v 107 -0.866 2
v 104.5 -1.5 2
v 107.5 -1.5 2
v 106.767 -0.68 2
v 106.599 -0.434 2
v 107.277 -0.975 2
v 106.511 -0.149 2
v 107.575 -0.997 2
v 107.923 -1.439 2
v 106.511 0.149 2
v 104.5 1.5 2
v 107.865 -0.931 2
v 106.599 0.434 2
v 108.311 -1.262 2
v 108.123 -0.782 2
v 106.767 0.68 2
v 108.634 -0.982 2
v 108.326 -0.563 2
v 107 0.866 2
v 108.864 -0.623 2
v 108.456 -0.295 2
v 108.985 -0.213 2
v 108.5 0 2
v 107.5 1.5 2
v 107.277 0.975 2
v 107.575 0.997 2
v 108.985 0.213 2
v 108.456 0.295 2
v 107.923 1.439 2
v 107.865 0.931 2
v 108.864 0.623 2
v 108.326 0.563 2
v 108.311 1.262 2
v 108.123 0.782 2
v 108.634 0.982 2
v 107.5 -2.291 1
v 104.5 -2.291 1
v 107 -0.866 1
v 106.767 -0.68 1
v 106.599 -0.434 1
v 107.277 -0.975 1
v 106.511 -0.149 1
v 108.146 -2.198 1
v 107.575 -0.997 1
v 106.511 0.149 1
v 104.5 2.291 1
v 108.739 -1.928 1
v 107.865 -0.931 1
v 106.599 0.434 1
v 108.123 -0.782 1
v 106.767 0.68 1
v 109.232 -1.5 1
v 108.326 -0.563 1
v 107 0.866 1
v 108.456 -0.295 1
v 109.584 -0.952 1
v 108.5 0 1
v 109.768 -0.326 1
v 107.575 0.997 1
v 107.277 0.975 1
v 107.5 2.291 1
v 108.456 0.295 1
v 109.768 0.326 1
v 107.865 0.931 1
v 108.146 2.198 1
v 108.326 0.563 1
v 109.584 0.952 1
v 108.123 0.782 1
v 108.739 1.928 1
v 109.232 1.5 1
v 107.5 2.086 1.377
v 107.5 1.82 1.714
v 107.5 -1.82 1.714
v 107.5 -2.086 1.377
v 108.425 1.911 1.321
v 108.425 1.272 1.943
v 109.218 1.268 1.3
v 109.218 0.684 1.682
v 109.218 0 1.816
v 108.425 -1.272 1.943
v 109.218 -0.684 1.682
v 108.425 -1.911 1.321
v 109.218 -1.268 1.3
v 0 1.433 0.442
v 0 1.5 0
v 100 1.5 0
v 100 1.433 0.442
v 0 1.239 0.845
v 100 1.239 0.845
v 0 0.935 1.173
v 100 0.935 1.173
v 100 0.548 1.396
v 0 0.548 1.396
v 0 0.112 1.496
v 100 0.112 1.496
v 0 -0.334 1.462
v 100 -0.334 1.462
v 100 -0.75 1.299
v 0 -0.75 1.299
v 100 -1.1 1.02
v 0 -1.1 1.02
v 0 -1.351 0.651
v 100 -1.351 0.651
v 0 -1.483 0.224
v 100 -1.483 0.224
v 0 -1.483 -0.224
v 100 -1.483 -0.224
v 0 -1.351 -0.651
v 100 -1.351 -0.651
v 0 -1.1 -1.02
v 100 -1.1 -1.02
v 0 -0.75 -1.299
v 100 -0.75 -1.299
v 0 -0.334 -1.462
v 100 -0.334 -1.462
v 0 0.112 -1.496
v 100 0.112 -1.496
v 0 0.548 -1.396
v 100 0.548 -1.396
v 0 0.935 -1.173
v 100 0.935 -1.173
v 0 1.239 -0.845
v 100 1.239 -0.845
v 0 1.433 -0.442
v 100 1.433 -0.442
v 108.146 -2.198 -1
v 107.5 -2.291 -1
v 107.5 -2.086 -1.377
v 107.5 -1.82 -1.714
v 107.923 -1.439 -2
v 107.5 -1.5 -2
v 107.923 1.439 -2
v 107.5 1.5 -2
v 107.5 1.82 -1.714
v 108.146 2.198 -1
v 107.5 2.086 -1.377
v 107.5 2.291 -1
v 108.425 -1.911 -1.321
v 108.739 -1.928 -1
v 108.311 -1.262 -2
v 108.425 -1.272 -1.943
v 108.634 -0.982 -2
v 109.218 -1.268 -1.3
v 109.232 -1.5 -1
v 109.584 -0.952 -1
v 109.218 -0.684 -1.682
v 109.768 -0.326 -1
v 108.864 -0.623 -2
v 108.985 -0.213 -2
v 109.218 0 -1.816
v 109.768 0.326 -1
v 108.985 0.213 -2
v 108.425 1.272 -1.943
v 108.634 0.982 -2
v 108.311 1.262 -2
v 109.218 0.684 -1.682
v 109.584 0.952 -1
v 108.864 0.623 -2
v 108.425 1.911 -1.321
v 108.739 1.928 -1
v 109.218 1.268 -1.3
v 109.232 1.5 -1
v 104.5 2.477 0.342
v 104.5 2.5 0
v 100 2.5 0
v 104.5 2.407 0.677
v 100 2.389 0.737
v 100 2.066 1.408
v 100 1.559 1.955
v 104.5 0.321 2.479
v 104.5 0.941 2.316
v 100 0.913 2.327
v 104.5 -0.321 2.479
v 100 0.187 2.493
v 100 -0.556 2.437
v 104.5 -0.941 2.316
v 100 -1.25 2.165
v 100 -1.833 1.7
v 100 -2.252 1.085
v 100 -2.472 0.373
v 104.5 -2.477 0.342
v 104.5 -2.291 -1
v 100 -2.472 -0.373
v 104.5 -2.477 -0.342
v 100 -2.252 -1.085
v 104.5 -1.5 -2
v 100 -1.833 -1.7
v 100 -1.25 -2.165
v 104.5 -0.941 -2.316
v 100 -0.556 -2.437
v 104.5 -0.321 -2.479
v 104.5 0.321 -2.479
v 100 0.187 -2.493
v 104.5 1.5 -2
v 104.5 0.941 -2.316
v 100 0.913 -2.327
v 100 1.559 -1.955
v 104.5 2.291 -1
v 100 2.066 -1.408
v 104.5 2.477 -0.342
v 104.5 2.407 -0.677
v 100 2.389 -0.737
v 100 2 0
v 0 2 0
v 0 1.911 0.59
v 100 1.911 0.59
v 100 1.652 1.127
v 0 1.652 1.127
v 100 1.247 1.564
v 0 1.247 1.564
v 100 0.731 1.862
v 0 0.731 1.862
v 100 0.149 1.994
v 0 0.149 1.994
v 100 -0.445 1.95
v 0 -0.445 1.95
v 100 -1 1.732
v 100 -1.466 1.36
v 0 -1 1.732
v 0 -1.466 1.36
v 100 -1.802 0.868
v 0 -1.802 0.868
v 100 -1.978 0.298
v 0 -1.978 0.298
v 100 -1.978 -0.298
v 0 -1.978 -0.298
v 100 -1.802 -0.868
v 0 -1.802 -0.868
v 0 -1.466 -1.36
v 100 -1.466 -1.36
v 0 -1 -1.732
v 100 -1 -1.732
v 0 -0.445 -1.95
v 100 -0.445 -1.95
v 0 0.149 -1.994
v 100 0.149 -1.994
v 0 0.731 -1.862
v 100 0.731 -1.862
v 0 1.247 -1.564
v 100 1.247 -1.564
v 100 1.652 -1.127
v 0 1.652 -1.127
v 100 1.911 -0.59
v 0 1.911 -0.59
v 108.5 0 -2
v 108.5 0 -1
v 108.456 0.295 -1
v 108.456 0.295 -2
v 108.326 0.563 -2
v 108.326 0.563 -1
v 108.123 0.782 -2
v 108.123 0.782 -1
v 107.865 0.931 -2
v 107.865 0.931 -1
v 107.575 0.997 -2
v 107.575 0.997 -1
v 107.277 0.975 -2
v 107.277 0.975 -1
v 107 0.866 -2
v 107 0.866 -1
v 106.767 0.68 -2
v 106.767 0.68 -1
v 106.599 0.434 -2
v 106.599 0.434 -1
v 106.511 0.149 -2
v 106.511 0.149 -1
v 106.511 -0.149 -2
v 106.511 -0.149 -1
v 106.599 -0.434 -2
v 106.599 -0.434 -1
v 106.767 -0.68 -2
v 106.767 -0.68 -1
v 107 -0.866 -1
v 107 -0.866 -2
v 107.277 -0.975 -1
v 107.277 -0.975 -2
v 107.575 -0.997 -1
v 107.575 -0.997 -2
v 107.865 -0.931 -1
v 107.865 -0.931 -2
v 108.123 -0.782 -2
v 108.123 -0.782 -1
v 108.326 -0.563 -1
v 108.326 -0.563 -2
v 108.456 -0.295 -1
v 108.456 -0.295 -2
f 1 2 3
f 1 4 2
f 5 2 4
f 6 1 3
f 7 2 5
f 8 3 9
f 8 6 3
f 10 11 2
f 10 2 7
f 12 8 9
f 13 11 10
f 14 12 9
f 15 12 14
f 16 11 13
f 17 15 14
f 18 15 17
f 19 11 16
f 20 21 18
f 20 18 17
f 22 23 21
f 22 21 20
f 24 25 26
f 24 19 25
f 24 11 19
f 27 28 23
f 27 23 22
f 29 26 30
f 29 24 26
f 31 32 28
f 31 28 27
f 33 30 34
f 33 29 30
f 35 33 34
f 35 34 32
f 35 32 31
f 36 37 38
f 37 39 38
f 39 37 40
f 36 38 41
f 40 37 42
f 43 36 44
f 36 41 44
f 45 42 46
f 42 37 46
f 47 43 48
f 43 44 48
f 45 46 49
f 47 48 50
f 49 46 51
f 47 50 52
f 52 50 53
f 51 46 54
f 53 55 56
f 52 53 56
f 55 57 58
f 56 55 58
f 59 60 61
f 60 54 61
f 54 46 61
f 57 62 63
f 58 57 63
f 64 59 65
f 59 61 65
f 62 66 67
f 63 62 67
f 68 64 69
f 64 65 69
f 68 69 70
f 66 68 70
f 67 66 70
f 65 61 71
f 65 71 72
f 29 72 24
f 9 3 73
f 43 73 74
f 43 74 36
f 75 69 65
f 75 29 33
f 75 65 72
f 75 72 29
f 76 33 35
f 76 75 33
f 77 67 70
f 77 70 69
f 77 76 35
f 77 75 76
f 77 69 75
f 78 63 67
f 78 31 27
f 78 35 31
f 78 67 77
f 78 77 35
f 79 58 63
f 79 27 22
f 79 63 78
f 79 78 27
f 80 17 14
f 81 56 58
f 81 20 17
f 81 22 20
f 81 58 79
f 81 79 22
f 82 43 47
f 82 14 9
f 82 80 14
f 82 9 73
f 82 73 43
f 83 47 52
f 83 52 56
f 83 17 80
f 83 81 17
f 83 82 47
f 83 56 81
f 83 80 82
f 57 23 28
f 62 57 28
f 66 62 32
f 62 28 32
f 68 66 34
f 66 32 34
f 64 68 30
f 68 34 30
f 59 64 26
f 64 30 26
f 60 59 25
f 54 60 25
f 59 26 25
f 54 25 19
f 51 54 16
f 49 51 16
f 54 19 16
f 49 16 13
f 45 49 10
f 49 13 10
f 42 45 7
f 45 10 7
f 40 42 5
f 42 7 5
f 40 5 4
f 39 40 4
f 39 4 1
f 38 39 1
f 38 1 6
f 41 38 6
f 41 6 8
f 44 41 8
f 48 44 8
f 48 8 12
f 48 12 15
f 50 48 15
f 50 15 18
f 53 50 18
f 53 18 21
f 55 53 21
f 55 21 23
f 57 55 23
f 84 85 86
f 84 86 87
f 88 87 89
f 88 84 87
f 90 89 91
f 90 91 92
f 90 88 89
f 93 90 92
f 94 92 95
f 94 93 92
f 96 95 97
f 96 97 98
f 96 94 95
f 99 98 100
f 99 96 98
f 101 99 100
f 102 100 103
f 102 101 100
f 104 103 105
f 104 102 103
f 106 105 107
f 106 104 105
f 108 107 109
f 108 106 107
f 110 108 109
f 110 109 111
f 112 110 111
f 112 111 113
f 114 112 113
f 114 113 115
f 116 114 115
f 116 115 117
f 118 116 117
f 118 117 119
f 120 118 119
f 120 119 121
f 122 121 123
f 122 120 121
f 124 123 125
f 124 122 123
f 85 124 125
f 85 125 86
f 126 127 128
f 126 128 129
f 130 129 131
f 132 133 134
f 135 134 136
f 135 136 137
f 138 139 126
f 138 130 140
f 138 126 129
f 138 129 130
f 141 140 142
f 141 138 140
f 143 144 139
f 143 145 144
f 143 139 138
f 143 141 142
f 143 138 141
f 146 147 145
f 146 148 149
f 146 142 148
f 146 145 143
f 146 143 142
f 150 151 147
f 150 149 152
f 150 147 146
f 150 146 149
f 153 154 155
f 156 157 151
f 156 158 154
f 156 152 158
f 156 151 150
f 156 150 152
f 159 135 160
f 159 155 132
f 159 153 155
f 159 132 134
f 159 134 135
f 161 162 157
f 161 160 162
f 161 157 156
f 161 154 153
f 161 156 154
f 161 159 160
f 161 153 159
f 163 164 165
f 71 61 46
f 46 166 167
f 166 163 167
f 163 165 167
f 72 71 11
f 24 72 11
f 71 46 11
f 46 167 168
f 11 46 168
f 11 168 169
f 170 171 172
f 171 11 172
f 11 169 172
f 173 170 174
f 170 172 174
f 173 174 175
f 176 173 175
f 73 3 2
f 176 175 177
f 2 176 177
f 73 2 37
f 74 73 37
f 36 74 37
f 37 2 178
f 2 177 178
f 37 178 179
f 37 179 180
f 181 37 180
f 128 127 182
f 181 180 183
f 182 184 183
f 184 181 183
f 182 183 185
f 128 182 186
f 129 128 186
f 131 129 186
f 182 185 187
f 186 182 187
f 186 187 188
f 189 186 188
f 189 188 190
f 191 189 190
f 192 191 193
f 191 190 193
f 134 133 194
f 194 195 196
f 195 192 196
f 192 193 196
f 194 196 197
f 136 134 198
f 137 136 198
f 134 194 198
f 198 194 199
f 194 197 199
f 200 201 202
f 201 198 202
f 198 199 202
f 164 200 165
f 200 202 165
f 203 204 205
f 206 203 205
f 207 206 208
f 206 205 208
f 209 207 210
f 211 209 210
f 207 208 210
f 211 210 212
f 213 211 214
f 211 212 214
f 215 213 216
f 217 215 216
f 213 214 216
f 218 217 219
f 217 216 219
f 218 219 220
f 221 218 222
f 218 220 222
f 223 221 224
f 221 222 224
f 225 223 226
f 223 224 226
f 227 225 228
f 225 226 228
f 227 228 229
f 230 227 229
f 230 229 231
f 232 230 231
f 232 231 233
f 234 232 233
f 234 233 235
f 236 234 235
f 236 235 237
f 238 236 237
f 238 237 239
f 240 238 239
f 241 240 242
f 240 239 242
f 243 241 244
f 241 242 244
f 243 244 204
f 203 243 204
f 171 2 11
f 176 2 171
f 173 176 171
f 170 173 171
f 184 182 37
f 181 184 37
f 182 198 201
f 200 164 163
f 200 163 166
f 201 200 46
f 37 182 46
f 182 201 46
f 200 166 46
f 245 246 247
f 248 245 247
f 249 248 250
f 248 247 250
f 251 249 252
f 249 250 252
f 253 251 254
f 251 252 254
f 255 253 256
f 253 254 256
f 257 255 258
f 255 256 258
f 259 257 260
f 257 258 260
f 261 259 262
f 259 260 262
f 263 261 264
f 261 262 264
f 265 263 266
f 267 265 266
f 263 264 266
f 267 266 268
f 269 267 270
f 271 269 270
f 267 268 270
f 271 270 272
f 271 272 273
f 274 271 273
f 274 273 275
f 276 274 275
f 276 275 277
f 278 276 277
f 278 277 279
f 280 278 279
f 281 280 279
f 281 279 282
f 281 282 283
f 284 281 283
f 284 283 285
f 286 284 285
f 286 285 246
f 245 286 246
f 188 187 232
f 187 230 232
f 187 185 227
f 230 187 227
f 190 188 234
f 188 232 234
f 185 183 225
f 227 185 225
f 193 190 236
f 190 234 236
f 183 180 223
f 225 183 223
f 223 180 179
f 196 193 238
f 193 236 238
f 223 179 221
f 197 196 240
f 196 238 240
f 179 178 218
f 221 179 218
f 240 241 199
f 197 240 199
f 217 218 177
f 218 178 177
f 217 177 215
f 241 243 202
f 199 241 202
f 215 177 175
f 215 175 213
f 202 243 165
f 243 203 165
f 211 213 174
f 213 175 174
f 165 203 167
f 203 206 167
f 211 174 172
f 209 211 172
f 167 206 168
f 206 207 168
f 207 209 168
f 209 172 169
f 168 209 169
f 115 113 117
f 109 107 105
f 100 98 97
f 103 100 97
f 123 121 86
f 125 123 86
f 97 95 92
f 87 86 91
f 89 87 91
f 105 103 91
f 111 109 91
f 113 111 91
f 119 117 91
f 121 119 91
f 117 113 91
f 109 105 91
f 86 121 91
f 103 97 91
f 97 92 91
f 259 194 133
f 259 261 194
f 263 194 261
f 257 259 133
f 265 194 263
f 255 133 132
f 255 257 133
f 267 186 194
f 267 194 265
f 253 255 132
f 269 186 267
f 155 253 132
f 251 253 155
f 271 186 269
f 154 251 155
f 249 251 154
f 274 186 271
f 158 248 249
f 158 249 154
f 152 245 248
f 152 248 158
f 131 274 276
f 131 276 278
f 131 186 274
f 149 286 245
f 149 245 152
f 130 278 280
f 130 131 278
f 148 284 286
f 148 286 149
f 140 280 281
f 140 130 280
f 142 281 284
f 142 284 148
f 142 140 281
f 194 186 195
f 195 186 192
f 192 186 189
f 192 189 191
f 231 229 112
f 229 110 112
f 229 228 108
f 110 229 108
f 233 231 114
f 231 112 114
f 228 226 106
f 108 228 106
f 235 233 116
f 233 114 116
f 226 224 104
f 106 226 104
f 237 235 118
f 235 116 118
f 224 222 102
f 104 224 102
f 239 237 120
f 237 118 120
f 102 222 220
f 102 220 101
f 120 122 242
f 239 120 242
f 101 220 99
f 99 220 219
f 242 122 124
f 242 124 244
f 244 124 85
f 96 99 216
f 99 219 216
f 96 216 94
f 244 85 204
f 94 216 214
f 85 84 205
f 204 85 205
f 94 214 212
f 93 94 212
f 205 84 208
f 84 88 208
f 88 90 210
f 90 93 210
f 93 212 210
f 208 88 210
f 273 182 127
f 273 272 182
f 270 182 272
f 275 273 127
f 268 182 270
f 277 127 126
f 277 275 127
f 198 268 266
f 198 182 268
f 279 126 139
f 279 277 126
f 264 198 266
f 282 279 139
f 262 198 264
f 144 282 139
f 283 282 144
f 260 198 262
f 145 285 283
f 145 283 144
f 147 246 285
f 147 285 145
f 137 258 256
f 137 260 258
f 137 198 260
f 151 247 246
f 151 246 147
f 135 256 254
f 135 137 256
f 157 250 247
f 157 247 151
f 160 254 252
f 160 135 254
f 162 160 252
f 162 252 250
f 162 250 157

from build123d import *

# Parameters (mm, degrees)
F0_R     = 2
F0_R_2   = 1.5
F1_DEPTH = 100
F2_R     = 2.5
F2_R_2   = 2
F2_R_3   = 1.5
F3_DEPTH = 10
F4_R     = 2.5
F5_W     = 10
F5_H     = 2
F6_DEPTH = 5
F7_R     = 1
F8_DEPTH = 4.501


with BuildPart() as f1:
    # F0 (on Right) → F1 (new body)
    with BuildSketch(Plane.YZ):
        Circle(F0_R)
        Circle(F0_R_2, mode=Mode.SUBTRACT)
    extrude(amount=F1_DEPTH)

    # F2 (on face) → F3 (join)
    with BuildSketch(Plane.YZ.offset(100)):
        Circle(F2_R)
        Circle(F2_R_2, mode=Mode.SUBTRACT)
        Circle(F2_R_2)
        Circle(F2_R_3, mode=Mode.SUBTRACT)
        Circle(F2_R_3)
    extrude(amount=F3_DEPTH)

    # F4
    f4_edges = [f1.edges().sort_by_distance(p)[0] for p in [
        (110, -2.5, 0),
    ]]
    fillet(f4_edges, radius=F4_R)

    # F5 (on Front) → F6 (cut, symmetric)
    with BuildSketch(Plane.XZ):
        with Locations((109.5, 3)):
            Rectangle(F5_W, F5_H)
        with Locations((109.5, 0)):
            Rectangle(F5_W, F5_H)
        with Locations((109.5, -3)):
            Rectangle(F5_W, F5_H)
    extrude(amount=F6_DEPTH, both=True, mode=Mode.SUBTRACT)

    # F7 (on face) → F8 (cut, through all)
    with BuildSketch(Plane.XY.offset(2)):
        with Locations((107.5, 0)):
            Circle(F7_R)
    extrude(amount=-F8_DEPTH, mode=Mode.SUBTRACT)


solid = f1.part
